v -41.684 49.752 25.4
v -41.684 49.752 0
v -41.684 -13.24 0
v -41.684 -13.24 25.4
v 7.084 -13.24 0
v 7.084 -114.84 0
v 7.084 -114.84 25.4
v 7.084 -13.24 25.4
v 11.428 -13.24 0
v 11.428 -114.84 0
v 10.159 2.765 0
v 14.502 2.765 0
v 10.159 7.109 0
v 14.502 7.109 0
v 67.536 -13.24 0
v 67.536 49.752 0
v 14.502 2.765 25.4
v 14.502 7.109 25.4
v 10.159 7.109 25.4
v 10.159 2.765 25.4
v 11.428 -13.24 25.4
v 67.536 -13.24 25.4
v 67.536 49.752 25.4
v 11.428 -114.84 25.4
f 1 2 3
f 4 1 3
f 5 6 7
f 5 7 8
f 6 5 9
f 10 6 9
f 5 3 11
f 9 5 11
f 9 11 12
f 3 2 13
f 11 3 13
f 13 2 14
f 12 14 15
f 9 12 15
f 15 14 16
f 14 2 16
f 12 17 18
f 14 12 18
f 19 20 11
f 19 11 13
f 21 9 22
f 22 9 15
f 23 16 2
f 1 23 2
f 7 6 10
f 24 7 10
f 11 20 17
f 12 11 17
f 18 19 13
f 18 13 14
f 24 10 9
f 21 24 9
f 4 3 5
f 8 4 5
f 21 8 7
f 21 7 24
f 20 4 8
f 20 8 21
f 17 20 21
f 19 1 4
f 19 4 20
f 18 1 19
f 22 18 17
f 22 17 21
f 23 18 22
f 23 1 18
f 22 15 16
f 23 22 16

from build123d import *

# Parameters (mm, degrees)
F0_W     = 4.3434
F0_H     = 101.6
F1_DEPTH = 25.4
F2_W     = 4.3434
F2_H     = 4.3434
F3_DEPTH = 25.401


with BuildPart() as f1:
    # F0 (on Top) → F1 (new body)
    with BuildSketch(Plane.XY):
        Polygon((67.536269, 49.751887), (-41.683737, 49.751887), (-41.683737, -13.240114), (7.084264, -13.240114), (11.427664, -13.240114), (67.536269, -13.240114), align=None)
        with Locations((9.255964, -64.040114)):
            Rectangle(F0_W, F0_H)
    extrude(amount=F1_DEPTH)

    # F2 (on face) → F3 (cut, through all)
    with BuildSketch(Plane.XY.offset(25.4)):
        with Locations((12.330785, 4.937064)):
            Rectangle(F2_W, F2_H)
    extrude(amount=-F3_DEPTH, mode=Mode.SUBTRACT)


solid = f1.part
